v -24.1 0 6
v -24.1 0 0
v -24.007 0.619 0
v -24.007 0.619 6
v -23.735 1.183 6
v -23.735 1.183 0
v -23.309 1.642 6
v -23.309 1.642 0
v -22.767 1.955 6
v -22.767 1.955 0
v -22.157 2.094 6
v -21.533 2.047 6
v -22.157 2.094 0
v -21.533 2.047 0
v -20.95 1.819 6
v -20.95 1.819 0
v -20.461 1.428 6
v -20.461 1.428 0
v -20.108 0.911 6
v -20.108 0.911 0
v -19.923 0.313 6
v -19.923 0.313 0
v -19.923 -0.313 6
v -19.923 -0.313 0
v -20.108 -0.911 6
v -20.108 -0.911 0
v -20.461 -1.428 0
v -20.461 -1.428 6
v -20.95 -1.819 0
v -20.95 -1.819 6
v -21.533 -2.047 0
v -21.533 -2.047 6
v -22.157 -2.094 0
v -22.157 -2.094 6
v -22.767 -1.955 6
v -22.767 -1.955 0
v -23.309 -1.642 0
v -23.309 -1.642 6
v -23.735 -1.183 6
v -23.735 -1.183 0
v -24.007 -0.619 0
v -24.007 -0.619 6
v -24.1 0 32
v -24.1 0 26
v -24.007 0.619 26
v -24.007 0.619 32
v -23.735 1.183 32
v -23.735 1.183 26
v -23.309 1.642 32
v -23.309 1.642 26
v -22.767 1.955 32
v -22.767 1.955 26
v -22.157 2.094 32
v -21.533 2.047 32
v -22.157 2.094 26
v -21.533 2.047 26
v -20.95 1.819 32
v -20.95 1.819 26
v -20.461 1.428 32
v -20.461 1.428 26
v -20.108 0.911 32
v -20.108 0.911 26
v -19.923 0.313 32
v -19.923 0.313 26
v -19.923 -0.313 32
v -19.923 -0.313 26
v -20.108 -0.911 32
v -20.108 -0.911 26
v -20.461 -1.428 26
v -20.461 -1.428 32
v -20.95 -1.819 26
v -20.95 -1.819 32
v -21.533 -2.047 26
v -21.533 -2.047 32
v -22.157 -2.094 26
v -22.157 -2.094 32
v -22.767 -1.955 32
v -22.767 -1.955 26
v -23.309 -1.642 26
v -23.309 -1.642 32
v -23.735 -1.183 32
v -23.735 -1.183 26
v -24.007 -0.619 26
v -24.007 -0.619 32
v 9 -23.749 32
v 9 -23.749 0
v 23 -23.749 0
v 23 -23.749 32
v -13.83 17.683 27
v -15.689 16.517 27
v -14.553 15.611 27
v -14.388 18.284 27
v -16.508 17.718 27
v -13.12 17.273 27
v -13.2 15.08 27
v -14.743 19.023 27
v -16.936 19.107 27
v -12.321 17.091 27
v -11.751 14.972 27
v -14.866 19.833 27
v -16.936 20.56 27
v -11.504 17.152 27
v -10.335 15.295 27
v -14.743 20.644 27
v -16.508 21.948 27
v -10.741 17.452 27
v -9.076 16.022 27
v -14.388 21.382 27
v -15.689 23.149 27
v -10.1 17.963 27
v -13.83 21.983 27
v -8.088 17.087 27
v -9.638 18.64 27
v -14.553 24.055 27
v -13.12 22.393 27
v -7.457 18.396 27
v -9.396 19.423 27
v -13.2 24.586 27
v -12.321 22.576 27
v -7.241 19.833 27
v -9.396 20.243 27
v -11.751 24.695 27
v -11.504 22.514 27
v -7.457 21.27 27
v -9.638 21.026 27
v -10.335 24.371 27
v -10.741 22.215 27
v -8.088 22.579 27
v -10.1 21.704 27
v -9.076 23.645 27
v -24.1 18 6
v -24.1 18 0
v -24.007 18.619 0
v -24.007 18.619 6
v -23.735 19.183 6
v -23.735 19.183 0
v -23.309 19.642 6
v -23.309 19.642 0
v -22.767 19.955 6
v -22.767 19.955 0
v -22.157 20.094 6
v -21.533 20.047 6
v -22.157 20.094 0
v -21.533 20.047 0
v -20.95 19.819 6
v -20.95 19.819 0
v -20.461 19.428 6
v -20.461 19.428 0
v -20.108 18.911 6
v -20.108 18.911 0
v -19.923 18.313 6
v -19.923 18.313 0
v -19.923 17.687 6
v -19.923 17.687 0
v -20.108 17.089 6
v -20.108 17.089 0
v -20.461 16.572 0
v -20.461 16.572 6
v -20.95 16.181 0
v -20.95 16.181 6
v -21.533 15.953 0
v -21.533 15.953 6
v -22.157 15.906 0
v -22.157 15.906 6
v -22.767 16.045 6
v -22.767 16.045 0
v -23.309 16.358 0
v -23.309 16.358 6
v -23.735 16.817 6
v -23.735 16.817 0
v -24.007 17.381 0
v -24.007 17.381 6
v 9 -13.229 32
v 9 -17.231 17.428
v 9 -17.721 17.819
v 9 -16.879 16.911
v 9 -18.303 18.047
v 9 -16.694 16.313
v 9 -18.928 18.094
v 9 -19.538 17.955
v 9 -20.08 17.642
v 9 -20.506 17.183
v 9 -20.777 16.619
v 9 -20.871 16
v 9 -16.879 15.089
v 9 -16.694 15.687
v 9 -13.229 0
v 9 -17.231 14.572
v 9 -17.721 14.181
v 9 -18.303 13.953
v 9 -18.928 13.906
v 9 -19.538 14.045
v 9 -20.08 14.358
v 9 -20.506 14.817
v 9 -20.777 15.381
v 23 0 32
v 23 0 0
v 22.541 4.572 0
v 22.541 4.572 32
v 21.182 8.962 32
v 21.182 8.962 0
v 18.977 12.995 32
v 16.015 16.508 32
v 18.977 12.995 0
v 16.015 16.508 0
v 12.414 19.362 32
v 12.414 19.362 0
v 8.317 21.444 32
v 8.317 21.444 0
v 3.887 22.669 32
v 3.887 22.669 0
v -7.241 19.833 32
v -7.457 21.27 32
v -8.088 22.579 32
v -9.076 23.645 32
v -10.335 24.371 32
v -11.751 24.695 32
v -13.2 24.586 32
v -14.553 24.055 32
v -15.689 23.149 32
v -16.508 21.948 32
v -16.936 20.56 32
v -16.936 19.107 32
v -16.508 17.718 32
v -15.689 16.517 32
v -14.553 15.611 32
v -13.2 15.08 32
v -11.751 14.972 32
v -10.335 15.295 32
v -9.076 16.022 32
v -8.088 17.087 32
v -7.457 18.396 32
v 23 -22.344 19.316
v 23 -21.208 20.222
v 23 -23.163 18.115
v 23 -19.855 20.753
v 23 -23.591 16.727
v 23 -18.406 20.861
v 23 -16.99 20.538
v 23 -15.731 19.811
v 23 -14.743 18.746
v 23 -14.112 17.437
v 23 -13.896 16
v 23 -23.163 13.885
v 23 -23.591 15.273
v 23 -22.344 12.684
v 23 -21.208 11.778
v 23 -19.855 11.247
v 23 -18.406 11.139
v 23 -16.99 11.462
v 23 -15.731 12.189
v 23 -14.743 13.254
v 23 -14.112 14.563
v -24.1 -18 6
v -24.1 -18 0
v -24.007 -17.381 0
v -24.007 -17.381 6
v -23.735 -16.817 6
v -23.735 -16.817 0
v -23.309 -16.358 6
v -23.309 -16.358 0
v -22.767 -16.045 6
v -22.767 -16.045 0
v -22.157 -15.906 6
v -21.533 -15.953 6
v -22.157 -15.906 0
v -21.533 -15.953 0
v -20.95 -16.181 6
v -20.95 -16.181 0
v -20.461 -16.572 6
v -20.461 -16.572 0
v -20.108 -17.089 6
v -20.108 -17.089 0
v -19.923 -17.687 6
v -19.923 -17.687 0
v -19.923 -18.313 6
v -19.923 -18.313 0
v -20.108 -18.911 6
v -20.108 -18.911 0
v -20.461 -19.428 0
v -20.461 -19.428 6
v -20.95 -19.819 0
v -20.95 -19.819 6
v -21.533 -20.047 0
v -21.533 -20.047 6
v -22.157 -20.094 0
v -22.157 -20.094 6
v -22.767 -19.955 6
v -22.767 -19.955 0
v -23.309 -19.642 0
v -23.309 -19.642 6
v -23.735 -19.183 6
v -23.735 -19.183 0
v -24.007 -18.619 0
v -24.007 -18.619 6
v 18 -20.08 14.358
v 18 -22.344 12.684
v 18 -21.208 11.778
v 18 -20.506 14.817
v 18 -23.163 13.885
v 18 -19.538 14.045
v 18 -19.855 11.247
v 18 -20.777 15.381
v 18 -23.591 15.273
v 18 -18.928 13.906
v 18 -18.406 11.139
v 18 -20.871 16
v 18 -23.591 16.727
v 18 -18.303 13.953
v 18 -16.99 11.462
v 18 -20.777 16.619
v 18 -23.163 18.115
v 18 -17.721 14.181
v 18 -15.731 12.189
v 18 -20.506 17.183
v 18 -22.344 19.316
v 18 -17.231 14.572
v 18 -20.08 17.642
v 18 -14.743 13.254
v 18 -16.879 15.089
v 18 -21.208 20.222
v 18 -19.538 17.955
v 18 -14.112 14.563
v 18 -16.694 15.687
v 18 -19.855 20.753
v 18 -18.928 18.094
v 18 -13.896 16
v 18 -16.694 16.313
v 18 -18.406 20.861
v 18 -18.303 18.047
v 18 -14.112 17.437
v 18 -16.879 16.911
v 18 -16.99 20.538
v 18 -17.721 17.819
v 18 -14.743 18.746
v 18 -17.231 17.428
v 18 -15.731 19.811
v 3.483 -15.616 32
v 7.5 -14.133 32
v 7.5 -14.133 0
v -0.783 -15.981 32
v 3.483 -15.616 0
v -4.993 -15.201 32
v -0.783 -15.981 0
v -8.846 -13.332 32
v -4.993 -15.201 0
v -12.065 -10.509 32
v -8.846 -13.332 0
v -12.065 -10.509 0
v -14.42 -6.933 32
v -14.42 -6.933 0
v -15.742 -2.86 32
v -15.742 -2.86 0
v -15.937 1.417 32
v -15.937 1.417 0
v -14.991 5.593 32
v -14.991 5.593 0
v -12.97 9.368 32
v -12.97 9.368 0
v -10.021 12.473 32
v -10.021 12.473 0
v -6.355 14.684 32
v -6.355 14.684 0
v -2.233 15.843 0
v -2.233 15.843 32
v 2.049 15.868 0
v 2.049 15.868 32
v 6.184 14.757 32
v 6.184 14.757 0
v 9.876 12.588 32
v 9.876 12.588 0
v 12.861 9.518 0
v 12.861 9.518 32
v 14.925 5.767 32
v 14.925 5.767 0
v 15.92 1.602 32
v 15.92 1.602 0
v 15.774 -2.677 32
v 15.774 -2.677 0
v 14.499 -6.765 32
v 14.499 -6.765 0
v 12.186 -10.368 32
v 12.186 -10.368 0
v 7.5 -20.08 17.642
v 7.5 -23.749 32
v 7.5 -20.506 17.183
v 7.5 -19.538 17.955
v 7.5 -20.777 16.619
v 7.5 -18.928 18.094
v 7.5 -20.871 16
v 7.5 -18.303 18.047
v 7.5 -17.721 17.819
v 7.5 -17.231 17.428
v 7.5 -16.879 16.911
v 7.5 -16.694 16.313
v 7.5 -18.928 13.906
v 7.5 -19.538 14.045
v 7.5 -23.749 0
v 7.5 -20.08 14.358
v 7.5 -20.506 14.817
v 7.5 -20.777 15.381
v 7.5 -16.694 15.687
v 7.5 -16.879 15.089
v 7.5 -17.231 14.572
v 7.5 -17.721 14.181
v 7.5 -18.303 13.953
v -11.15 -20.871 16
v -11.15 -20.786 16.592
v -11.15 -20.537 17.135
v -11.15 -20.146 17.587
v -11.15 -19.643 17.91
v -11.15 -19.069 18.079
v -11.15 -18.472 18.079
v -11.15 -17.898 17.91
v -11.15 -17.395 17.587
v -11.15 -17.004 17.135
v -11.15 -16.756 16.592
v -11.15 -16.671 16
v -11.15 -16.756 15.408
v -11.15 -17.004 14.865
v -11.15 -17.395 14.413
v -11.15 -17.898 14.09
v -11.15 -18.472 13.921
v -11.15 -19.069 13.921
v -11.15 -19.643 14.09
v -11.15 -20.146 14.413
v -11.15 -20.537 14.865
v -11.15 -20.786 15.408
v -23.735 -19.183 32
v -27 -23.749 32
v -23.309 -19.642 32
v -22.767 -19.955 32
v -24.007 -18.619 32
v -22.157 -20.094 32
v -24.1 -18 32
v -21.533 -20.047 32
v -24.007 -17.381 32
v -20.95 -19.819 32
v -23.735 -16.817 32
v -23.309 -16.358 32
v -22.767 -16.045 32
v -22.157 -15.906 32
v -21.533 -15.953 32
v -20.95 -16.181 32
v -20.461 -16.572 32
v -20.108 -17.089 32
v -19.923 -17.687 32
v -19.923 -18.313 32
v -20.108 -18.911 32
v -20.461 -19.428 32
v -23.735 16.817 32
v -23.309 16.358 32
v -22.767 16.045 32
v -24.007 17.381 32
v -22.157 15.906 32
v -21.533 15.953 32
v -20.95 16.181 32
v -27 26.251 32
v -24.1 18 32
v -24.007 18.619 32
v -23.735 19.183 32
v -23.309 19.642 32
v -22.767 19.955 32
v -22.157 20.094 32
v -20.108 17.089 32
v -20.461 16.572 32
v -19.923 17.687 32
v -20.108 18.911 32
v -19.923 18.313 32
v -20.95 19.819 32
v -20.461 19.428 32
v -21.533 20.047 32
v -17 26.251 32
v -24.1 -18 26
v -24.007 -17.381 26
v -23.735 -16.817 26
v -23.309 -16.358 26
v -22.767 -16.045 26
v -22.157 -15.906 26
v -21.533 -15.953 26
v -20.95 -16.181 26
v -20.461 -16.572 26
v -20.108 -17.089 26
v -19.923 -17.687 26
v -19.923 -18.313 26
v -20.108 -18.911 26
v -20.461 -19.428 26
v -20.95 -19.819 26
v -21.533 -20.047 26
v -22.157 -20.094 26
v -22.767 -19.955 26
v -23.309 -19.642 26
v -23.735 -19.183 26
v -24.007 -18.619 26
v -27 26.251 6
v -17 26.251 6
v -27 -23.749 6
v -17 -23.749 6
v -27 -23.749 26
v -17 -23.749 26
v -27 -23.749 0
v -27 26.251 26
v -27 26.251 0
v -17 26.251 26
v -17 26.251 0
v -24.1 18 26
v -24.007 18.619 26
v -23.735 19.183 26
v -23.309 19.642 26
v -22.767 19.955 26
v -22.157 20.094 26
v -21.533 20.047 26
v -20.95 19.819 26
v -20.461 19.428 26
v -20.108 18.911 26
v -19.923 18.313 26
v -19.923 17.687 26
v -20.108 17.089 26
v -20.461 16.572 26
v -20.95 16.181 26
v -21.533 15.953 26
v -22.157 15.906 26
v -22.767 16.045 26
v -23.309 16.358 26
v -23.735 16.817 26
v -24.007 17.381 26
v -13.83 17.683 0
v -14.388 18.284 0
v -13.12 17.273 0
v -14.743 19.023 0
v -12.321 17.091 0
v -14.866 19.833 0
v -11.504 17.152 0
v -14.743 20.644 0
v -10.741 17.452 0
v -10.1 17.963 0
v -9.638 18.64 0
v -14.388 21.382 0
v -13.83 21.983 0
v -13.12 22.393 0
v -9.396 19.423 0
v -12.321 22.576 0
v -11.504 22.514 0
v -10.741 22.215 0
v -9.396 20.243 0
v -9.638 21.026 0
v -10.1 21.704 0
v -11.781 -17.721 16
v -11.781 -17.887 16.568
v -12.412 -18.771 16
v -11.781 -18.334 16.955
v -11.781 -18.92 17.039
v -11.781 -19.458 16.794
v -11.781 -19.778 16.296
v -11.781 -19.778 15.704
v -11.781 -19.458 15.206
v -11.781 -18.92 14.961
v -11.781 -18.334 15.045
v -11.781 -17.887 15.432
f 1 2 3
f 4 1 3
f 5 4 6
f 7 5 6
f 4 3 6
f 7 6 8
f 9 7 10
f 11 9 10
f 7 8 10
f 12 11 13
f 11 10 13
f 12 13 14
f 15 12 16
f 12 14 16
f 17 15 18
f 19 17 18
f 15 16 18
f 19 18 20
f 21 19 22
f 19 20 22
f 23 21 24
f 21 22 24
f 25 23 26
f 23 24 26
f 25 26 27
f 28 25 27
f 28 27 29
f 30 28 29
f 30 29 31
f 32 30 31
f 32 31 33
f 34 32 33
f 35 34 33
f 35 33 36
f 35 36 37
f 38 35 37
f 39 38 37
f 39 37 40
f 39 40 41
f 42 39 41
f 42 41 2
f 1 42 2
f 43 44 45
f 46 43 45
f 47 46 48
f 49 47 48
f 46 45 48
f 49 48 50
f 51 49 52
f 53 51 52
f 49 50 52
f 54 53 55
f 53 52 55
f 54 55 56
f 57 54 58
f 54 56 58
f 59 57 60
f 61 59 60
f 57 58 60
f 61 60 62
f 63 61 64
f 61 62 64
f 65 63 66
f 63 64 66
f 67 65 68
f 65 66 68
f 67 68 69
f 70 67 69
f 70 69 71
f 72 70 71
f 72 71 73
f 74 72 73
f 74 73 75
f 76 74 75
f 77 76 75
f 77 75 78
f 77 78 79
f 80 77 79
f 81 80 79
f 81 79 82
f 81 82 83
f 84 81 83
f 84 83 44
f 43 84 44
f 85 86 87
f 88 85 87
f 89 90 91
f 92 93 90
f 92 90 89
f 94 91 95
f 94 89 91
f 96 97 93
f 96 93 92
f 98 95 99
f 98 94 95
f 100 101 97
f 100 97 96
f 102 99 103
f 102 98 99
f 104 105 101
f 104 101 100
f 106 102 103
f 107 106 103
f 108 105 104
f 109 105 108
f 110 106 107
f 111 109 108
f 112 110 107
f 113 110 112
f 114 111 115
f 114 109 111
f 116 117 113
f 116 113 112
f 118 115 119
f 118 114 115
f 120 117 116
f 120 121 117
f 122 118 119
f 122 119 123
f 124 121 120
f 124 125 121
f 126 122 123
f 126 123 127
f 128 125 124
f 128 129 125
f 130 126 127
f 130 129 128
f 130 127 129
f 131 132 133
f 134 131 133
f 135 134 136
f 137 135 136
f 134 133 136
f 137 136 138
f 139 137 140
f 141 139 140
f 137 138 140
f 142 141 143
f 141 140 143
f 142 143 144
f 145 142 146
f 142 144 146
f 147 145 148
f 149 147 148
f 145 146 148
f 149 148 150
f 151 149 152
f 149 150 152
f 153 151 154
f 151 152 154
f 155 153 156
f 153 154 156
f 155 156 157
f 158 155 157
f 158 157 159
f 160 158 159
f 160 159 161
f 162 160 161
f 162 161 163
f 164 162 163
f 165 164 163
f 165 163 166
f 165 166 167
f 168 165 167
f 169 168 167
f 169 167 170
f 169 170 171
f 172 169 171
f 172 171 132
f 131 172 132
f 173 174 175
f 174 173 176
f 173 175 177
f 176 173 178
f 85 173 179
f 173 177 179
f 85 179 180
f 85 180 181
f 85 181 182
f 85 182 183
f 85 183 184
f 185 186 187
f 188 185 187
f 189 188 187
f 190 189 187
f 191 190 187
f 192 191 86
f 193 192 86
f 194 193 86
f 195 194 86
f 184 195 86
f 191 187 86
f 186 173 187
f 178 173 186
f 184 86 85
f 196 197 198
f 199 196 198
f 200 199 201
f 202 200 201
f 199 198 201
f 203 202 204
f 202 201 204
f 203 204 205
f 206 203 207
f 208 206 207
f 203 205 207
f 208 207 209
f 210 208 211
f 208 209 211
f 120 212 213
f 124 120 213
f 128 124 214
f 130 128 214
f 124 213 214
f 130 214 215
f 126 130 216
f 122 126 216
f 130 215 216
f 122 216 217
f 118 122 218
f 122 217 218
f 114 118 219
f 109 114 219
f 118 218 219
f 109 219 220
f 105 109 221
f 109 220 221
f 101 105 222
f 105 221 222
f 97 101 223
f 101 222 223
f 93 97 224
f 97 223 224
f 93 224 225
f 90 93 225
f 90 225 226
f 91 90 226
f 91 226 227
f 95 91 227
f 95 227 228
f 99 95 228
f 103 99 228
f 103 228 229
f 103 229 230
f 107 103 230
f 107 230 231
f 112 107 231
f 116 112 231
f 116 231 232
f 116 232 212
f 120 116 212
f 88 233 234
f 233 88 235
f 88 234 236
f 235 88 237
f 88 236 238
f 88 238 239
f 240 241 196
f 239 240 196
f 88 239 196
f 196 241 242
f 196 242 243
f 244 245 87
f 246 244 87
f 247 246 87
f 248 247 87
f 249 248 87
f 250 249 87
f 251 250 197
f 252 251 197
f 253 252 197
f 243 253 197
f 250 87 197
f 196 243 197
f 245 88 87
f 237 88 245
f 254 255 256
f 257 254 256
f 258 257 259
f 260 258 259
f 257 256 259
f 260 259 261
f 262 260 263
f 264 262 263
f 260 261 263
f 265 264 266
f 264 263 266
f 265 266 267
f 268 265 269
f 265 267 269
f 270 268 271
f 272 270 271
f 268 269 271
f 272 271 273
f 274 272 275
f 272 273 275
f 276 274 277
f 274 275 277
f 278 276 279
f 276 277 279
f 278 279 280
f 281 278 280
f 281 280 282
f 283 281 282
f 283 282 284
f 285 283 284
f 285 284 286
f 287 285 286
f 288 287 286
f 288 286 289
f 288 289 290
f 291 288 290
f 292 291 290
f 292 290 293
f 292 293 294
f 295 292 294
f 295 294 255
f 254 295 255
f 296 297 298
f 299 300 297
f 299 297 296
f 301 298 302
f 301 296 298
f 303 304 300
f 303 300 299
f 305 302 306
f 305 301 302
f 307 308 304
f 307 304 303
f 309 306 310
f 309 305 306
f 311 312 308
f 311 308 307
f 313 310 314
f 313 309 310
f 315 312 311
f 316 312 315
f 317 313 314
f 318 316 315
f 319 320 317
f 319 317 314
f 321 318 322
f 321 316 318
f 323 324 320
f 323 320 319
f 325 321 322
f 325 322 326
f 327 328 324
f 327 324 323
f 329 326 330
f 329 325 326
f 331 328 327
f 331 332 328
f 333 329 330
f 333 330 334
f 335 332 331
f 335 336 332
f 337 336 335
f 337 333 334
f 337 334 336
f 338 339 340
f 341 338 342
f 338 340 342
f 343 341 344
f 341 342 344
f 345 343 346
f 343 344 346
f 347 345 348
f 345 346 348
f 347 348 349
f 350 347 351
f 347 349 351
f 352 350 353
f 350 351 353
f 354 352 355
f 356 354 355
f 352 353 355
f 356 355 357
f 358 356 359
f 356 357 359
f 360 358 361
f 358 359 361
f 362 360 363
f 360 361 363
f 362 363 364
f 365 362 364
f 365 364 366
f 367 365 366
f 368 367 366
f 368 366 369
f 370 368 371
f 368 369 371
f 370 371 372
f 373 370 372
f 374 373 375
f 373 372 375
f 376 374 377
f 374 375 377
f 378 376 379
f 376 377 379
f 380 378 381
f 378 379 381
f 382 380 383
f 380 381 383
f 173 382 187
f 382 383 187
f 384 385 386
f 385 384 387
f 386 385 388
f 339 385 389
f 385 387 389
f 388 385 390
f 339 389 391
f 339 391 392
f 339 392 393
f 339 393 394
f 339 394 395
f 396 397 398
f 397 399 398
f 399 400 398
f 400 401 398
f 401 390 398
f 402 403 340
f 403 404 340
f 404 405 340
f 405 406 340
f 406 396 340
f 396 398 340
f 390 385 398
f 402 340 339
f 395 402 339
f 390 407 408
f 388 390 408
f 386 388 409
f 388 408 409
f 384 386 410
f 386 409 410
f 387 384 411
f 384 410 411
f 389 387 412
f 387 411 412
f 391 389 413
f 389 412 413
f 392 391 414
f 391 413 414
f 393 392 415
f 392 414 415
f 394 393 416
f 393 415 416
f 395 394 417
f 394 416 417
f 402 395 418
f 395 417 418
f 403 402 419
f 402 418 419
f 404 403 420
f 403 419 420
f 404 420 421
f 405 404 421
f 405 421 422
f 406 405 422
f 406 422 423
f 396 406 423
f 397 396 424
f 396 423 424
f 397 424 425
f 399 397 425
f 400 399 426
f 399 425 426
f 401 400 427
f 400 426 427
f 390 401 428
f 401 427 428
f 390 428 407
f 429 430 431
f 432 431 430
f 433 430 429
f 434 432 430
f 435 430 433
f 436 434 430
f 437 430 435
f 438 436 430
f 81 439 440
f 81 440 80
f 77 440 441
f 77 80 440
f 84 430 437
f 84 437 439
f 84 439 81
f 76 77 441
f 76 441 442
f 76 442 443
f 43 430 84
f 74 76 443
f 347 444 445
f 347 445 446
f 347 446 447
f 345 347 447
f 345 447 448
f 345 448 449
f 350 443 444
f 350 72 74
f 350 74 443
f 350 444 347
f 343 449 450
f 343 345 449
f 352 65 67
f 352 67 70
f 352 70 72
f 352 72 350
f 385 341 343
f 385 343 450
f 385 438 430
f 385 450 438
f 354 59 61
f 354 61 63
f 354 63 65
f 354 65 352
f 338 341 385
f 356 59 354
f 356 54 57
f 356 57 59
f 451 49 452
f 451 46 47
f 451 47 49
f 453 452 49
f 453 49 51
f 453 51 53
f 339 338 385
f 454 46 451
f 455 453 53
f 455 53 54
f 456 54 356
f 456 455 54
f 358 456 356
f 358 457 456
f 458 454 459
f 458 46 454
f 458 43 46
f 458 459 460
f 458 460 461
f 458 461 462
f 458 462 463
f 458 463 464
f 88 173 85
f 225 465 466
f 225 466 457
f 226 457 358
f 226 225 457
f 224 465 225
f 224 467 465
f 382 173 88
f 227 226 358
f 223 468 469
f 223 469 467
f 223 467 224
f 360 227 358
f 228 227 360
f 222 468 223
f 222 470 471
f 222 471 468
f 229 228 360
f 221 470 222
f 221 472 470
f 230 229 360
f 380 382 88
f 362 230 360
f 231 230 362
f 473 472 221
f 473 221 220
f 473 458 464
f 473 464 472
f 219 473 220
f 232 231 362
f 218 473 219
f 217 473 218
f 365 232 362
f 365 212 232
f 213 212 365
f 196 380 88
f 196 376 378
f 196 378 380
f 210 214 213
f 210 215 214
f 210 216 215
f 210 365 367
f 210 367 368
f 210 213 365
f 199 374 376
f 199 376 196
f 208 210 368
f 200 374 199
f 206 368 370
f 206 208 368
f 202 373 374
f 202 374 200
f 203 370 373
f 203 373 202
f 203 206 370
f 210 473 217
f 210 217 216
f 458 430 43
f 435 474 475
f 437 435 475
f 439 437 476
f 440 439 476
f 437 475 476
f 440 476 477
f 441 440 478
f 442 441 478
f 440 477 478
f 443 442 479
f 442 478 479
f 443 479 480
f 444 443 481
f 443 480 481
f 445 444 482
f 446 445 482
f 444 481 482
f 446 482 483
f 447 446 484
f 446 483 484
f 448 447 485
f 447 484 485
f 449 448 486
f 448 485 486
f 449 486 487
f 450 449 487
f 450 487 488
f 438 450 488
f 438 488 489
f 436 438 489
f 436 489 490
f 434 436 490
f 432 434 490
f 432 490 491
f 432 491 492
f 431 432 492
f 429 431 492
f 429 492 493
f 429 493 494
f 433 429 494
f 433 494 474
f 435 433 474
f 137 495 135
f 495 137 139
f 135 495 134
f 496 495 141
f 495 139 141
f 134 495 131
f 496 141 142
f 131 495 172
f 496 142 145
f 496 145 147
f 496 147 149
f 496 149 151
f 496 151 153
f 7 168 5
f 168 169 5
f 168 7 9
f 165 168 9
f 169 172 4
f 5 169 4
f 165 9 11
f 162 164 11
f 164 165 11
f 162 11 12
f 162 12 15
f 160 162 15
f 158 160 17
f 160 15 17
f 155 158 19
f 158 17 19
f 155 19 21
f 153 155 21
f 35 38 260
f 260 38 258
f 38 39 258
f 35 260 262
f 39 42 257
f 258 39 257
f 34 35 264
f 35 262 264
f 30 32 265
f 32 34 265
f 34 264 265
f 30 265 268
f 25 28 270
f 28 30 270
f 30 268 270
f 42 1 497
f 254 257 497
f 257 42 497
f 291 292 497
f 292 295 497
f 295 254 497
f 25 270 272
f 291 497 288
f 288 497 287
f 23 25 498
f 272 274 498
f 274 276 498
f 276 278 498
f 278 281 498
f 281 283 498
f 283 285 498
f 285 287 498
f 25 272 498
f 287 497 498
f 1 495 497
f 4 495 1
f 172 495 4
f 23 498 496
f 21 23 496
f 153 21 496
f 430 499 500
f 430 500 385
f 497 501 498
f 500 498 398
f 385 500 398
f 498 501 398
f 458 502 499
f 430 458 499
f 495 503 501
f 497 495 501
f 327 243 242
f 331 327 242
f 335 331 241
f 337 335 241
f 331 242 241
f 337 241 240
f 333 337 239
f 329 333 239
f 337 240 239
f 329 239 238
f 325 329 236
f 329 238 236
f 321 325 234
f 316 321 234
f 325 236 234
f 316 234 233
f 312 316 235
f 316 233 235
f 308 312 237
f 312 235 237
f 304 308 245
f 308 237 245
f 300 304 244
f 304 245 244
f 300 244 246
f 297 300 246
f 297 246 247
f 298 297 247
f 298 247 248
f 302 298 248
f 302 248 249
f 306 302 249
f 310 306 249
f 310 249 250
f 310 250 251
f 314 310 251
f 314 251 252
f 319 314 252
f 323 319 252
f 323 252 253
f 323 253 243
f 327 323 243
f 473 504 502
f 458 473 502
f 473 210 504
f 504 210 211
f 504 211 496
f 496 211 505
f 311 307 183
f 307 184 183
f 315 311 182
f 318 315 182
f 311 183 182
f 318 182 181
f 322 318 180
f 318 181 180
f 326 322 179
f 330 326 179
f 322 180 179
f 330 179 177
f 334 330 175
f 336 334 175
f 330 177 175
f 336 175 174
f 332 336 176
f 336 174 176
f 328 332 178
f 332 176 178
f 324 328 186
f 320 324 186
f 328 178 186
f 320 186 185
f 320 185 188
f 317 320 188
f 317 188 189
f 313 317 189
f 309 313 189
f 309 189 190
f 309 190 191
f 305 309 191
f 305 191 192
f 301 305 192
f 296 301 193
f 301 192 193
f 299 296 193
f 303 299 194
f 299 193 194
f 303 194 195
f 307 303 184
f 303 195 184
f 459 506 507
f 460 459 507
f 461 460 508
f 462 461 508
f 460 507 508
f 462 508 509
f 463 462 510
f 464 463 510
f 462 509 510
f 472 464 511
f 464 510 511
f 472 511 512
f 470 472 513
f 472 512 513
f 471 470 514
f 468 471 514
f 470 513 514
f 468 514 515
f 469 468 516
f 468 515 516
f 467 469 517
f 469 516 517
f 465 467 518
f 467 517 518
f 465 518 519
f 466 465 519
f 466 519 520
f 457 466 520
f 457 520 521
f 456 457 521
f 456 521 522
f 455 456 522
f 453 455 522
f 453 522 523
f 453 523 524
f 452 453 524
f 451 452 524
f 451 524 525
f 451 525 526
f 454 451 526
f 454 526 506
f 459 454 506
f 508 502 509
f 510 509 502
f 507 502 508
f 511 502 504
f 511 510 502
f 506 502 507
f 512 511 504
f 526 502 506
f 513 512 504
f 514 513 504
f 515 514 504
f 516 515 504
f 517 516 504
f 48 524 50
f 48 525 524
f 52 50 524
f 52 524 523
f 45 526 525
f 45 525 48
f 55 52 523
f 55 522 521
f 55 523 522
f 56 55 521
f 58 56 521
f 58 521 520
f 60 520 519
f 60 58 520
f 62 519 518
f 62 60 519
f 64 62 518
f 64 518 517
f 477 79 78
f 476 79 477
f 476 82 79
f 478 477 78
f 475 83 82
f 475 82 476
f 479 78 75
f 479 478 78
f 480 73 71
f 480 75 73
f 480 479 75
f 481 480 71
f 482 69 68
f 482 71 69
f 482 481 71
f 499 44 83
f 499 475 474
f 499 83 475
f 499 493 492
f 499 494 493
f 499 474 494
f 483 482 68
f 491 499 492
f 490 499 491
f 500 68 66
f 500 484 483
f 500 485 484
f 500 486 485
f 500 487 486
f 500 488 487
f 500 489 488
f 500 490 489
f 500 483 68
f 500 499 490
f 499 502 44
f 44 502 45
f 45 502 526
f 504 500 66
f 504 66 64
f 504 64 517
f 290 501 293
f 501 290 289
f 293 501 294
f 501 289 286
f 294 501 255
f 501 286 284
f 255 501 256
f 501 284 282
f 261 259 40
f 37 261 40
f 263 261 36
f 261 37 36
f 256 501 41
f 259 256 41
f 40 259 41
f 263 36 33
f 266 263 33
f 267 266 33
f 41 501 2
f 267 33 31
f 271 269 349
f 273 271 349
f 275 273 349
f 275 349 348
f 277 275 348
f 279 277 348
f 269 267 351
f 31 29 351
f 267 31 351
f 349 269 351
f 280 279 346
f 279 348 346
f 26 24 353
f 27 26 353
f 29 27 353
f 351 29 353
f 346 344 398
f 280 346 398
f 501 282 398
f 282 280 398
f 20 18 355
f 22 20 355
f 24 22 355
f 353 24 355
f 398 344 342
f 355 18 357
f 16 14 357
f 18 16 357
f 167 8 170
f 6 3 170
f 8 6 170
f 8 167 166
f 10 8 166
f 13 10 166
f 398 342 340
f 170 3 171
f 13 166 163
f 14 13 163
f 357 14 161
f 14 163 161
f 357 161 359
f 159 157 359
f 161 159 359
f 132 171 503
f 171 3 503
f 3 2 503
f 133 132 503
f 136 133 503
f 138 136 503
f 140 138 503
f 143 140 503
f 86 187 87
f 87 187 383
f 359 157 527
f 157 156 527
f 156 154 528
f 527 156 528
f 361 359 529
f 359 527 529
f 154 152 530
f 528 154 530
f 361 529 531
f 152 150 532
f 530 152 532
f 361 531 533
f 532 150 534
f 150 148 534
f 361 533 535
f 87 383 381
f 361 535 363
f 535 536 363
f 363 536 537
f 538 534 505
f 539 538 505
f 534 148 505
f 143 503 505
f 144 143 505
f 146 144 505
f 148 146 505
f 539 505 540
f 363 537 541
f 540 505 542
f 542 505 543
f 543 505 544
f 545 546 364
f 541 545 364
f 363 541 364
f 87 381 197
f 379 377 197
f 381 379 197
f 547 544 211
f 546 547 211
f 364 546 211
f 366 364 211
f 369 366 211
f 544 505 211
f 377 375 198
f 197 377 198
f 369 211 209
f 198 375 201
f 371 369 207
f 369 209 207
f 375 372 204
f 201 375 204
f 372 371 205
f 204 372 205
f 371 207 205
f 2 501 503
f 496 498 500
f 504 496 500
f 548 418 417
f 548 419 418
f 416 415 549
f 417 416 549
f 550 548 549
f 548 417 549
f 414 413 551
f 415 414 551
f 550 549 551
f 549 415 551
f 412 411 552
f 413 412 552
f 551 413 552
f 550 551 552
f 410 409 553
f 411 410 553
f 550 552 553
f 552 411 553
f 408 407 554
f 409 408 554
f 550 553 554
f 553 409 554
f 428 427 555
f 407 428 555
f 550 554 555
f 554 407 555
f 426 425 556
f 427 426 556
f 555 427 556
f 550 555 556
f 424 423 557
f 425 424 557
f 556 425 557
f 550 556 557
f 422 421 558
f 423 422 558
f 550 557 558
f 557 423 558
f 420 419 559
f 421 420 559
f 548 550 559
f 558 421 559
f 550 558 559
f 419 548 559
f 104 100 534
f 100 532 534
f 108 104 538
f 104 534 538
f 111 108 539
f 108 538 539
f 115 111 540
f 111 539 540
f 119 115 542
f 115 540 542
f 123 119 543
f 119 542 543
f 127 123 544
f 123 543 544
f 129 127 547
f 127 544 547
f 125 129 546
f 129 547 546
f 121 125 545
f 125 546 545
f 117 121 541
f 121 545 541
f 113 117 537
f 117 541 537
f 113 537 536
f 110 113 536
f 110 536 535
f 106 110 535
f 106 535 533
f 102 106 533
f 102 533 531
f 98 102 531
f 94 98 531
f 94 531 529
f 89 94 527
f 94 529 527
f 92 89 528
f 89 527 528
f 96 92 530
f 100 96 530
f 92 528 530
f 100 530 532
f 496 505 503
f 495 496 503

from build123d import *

# Parameters (mm, degrees)
F1_DEPTH       = 32
F2_W           = 10
F2_H           = 20
F3_DEPTH       = 50.001
F5_D           = 4.2
F5_DEPTH       = 34.15
F5_CBORE_D     = 9.75
F5_CBORE_DEPTH = 5
F5_TIP         = 1.2618073
F7_D           = 4.2
F9_D           = 5.5
F9_CBORE_D     = 9.75
F9_CBORE_DEPTH = 5
F10_R          = 2.5
F11_DEPTH      = 7


with BuildPart() as f1:
    # F0 (on Top) → F1 (new body)
    with BuildSketch(Plane.XY):
        with BuildLine():
            ThreePointArc((7.5, -14.1332940251), (-8.2623874884, 13.7015675377), (9, -13.2287565553))
            Line((9, -13.2287565553), (9, -23.749))
            Line((9, -23.749), (23, -23.749))
            Line((23, -23.749), (23, 0))
            ThreePointArc((23, 0), (17.5842402782, 14.8254677444), (3.8874353183, 22.6690945264))
            Line((3.8874353183, 22.6690945264), (-17, 26.251))
            Line((-17, 26.251), (-27, 26.251))
            Line((-27, 26.251), (-27, -23.749))
            Line((-27, -23.749), (7.5, -23.749))
            Line((7.5, -23.749), (7.5, -14.1332940251))
        make_face()
    extrude(amount=F1_DEPTH)

    # F2 (on face) → F3 (cut, through all)
    with BuildSketch(Plane.XZ.offset(23.749)):
        with Locations((-22, 16)):
            Rectangle(F2_W, F2_H)
    extrude(amount=-F3_DEPTH, mode=Mode.SUBTRACT)

    # F5
    with Locations(Plane.YZ.offset(23)):
        with Locations((-18.7706, 16)):
            CounterBoreHole(F5_D / 2, F5_CBORE_D / 2, F5_CBORE_DEPTH, depth=F5_DEPTH)
            with Locations((0, 0, -(F5_DEPTH + F5_TIP / 2))):  # 118° drill point
                Cone(0, F5_D / 2, F5_TIP, mode=Mode.SUBTRACT)

    # F7 (through all)
    with Locations(Plane.XY.offset(32)):
        with Locations((-22, 18), (-22, 0), (-22, -18)):
            Hole(F7_D / 2)

    # F9 (through all)
    with Locations(Plane.XY.offset(32)):
        with Locations((-12.1156, 19.8332124892)):
            CounterBoreHole(F9_D / 2, F9_CBORE_D / 2, F9_CBORE_DEPTH)

    # F10 (on face) → F11 (cut)
    with BuildSketch(Plane(origin=(0, 0, 0), x_dir=(1, 0, 0), z_dir=(0, 0, -1))):
        with Locations((-12.1156, -19.8332124892)):
            Circle(F10_R)
    extrude(amount=-F11_DEPTH, mode=Mode.SUBTRACT)


solid = f1.part
